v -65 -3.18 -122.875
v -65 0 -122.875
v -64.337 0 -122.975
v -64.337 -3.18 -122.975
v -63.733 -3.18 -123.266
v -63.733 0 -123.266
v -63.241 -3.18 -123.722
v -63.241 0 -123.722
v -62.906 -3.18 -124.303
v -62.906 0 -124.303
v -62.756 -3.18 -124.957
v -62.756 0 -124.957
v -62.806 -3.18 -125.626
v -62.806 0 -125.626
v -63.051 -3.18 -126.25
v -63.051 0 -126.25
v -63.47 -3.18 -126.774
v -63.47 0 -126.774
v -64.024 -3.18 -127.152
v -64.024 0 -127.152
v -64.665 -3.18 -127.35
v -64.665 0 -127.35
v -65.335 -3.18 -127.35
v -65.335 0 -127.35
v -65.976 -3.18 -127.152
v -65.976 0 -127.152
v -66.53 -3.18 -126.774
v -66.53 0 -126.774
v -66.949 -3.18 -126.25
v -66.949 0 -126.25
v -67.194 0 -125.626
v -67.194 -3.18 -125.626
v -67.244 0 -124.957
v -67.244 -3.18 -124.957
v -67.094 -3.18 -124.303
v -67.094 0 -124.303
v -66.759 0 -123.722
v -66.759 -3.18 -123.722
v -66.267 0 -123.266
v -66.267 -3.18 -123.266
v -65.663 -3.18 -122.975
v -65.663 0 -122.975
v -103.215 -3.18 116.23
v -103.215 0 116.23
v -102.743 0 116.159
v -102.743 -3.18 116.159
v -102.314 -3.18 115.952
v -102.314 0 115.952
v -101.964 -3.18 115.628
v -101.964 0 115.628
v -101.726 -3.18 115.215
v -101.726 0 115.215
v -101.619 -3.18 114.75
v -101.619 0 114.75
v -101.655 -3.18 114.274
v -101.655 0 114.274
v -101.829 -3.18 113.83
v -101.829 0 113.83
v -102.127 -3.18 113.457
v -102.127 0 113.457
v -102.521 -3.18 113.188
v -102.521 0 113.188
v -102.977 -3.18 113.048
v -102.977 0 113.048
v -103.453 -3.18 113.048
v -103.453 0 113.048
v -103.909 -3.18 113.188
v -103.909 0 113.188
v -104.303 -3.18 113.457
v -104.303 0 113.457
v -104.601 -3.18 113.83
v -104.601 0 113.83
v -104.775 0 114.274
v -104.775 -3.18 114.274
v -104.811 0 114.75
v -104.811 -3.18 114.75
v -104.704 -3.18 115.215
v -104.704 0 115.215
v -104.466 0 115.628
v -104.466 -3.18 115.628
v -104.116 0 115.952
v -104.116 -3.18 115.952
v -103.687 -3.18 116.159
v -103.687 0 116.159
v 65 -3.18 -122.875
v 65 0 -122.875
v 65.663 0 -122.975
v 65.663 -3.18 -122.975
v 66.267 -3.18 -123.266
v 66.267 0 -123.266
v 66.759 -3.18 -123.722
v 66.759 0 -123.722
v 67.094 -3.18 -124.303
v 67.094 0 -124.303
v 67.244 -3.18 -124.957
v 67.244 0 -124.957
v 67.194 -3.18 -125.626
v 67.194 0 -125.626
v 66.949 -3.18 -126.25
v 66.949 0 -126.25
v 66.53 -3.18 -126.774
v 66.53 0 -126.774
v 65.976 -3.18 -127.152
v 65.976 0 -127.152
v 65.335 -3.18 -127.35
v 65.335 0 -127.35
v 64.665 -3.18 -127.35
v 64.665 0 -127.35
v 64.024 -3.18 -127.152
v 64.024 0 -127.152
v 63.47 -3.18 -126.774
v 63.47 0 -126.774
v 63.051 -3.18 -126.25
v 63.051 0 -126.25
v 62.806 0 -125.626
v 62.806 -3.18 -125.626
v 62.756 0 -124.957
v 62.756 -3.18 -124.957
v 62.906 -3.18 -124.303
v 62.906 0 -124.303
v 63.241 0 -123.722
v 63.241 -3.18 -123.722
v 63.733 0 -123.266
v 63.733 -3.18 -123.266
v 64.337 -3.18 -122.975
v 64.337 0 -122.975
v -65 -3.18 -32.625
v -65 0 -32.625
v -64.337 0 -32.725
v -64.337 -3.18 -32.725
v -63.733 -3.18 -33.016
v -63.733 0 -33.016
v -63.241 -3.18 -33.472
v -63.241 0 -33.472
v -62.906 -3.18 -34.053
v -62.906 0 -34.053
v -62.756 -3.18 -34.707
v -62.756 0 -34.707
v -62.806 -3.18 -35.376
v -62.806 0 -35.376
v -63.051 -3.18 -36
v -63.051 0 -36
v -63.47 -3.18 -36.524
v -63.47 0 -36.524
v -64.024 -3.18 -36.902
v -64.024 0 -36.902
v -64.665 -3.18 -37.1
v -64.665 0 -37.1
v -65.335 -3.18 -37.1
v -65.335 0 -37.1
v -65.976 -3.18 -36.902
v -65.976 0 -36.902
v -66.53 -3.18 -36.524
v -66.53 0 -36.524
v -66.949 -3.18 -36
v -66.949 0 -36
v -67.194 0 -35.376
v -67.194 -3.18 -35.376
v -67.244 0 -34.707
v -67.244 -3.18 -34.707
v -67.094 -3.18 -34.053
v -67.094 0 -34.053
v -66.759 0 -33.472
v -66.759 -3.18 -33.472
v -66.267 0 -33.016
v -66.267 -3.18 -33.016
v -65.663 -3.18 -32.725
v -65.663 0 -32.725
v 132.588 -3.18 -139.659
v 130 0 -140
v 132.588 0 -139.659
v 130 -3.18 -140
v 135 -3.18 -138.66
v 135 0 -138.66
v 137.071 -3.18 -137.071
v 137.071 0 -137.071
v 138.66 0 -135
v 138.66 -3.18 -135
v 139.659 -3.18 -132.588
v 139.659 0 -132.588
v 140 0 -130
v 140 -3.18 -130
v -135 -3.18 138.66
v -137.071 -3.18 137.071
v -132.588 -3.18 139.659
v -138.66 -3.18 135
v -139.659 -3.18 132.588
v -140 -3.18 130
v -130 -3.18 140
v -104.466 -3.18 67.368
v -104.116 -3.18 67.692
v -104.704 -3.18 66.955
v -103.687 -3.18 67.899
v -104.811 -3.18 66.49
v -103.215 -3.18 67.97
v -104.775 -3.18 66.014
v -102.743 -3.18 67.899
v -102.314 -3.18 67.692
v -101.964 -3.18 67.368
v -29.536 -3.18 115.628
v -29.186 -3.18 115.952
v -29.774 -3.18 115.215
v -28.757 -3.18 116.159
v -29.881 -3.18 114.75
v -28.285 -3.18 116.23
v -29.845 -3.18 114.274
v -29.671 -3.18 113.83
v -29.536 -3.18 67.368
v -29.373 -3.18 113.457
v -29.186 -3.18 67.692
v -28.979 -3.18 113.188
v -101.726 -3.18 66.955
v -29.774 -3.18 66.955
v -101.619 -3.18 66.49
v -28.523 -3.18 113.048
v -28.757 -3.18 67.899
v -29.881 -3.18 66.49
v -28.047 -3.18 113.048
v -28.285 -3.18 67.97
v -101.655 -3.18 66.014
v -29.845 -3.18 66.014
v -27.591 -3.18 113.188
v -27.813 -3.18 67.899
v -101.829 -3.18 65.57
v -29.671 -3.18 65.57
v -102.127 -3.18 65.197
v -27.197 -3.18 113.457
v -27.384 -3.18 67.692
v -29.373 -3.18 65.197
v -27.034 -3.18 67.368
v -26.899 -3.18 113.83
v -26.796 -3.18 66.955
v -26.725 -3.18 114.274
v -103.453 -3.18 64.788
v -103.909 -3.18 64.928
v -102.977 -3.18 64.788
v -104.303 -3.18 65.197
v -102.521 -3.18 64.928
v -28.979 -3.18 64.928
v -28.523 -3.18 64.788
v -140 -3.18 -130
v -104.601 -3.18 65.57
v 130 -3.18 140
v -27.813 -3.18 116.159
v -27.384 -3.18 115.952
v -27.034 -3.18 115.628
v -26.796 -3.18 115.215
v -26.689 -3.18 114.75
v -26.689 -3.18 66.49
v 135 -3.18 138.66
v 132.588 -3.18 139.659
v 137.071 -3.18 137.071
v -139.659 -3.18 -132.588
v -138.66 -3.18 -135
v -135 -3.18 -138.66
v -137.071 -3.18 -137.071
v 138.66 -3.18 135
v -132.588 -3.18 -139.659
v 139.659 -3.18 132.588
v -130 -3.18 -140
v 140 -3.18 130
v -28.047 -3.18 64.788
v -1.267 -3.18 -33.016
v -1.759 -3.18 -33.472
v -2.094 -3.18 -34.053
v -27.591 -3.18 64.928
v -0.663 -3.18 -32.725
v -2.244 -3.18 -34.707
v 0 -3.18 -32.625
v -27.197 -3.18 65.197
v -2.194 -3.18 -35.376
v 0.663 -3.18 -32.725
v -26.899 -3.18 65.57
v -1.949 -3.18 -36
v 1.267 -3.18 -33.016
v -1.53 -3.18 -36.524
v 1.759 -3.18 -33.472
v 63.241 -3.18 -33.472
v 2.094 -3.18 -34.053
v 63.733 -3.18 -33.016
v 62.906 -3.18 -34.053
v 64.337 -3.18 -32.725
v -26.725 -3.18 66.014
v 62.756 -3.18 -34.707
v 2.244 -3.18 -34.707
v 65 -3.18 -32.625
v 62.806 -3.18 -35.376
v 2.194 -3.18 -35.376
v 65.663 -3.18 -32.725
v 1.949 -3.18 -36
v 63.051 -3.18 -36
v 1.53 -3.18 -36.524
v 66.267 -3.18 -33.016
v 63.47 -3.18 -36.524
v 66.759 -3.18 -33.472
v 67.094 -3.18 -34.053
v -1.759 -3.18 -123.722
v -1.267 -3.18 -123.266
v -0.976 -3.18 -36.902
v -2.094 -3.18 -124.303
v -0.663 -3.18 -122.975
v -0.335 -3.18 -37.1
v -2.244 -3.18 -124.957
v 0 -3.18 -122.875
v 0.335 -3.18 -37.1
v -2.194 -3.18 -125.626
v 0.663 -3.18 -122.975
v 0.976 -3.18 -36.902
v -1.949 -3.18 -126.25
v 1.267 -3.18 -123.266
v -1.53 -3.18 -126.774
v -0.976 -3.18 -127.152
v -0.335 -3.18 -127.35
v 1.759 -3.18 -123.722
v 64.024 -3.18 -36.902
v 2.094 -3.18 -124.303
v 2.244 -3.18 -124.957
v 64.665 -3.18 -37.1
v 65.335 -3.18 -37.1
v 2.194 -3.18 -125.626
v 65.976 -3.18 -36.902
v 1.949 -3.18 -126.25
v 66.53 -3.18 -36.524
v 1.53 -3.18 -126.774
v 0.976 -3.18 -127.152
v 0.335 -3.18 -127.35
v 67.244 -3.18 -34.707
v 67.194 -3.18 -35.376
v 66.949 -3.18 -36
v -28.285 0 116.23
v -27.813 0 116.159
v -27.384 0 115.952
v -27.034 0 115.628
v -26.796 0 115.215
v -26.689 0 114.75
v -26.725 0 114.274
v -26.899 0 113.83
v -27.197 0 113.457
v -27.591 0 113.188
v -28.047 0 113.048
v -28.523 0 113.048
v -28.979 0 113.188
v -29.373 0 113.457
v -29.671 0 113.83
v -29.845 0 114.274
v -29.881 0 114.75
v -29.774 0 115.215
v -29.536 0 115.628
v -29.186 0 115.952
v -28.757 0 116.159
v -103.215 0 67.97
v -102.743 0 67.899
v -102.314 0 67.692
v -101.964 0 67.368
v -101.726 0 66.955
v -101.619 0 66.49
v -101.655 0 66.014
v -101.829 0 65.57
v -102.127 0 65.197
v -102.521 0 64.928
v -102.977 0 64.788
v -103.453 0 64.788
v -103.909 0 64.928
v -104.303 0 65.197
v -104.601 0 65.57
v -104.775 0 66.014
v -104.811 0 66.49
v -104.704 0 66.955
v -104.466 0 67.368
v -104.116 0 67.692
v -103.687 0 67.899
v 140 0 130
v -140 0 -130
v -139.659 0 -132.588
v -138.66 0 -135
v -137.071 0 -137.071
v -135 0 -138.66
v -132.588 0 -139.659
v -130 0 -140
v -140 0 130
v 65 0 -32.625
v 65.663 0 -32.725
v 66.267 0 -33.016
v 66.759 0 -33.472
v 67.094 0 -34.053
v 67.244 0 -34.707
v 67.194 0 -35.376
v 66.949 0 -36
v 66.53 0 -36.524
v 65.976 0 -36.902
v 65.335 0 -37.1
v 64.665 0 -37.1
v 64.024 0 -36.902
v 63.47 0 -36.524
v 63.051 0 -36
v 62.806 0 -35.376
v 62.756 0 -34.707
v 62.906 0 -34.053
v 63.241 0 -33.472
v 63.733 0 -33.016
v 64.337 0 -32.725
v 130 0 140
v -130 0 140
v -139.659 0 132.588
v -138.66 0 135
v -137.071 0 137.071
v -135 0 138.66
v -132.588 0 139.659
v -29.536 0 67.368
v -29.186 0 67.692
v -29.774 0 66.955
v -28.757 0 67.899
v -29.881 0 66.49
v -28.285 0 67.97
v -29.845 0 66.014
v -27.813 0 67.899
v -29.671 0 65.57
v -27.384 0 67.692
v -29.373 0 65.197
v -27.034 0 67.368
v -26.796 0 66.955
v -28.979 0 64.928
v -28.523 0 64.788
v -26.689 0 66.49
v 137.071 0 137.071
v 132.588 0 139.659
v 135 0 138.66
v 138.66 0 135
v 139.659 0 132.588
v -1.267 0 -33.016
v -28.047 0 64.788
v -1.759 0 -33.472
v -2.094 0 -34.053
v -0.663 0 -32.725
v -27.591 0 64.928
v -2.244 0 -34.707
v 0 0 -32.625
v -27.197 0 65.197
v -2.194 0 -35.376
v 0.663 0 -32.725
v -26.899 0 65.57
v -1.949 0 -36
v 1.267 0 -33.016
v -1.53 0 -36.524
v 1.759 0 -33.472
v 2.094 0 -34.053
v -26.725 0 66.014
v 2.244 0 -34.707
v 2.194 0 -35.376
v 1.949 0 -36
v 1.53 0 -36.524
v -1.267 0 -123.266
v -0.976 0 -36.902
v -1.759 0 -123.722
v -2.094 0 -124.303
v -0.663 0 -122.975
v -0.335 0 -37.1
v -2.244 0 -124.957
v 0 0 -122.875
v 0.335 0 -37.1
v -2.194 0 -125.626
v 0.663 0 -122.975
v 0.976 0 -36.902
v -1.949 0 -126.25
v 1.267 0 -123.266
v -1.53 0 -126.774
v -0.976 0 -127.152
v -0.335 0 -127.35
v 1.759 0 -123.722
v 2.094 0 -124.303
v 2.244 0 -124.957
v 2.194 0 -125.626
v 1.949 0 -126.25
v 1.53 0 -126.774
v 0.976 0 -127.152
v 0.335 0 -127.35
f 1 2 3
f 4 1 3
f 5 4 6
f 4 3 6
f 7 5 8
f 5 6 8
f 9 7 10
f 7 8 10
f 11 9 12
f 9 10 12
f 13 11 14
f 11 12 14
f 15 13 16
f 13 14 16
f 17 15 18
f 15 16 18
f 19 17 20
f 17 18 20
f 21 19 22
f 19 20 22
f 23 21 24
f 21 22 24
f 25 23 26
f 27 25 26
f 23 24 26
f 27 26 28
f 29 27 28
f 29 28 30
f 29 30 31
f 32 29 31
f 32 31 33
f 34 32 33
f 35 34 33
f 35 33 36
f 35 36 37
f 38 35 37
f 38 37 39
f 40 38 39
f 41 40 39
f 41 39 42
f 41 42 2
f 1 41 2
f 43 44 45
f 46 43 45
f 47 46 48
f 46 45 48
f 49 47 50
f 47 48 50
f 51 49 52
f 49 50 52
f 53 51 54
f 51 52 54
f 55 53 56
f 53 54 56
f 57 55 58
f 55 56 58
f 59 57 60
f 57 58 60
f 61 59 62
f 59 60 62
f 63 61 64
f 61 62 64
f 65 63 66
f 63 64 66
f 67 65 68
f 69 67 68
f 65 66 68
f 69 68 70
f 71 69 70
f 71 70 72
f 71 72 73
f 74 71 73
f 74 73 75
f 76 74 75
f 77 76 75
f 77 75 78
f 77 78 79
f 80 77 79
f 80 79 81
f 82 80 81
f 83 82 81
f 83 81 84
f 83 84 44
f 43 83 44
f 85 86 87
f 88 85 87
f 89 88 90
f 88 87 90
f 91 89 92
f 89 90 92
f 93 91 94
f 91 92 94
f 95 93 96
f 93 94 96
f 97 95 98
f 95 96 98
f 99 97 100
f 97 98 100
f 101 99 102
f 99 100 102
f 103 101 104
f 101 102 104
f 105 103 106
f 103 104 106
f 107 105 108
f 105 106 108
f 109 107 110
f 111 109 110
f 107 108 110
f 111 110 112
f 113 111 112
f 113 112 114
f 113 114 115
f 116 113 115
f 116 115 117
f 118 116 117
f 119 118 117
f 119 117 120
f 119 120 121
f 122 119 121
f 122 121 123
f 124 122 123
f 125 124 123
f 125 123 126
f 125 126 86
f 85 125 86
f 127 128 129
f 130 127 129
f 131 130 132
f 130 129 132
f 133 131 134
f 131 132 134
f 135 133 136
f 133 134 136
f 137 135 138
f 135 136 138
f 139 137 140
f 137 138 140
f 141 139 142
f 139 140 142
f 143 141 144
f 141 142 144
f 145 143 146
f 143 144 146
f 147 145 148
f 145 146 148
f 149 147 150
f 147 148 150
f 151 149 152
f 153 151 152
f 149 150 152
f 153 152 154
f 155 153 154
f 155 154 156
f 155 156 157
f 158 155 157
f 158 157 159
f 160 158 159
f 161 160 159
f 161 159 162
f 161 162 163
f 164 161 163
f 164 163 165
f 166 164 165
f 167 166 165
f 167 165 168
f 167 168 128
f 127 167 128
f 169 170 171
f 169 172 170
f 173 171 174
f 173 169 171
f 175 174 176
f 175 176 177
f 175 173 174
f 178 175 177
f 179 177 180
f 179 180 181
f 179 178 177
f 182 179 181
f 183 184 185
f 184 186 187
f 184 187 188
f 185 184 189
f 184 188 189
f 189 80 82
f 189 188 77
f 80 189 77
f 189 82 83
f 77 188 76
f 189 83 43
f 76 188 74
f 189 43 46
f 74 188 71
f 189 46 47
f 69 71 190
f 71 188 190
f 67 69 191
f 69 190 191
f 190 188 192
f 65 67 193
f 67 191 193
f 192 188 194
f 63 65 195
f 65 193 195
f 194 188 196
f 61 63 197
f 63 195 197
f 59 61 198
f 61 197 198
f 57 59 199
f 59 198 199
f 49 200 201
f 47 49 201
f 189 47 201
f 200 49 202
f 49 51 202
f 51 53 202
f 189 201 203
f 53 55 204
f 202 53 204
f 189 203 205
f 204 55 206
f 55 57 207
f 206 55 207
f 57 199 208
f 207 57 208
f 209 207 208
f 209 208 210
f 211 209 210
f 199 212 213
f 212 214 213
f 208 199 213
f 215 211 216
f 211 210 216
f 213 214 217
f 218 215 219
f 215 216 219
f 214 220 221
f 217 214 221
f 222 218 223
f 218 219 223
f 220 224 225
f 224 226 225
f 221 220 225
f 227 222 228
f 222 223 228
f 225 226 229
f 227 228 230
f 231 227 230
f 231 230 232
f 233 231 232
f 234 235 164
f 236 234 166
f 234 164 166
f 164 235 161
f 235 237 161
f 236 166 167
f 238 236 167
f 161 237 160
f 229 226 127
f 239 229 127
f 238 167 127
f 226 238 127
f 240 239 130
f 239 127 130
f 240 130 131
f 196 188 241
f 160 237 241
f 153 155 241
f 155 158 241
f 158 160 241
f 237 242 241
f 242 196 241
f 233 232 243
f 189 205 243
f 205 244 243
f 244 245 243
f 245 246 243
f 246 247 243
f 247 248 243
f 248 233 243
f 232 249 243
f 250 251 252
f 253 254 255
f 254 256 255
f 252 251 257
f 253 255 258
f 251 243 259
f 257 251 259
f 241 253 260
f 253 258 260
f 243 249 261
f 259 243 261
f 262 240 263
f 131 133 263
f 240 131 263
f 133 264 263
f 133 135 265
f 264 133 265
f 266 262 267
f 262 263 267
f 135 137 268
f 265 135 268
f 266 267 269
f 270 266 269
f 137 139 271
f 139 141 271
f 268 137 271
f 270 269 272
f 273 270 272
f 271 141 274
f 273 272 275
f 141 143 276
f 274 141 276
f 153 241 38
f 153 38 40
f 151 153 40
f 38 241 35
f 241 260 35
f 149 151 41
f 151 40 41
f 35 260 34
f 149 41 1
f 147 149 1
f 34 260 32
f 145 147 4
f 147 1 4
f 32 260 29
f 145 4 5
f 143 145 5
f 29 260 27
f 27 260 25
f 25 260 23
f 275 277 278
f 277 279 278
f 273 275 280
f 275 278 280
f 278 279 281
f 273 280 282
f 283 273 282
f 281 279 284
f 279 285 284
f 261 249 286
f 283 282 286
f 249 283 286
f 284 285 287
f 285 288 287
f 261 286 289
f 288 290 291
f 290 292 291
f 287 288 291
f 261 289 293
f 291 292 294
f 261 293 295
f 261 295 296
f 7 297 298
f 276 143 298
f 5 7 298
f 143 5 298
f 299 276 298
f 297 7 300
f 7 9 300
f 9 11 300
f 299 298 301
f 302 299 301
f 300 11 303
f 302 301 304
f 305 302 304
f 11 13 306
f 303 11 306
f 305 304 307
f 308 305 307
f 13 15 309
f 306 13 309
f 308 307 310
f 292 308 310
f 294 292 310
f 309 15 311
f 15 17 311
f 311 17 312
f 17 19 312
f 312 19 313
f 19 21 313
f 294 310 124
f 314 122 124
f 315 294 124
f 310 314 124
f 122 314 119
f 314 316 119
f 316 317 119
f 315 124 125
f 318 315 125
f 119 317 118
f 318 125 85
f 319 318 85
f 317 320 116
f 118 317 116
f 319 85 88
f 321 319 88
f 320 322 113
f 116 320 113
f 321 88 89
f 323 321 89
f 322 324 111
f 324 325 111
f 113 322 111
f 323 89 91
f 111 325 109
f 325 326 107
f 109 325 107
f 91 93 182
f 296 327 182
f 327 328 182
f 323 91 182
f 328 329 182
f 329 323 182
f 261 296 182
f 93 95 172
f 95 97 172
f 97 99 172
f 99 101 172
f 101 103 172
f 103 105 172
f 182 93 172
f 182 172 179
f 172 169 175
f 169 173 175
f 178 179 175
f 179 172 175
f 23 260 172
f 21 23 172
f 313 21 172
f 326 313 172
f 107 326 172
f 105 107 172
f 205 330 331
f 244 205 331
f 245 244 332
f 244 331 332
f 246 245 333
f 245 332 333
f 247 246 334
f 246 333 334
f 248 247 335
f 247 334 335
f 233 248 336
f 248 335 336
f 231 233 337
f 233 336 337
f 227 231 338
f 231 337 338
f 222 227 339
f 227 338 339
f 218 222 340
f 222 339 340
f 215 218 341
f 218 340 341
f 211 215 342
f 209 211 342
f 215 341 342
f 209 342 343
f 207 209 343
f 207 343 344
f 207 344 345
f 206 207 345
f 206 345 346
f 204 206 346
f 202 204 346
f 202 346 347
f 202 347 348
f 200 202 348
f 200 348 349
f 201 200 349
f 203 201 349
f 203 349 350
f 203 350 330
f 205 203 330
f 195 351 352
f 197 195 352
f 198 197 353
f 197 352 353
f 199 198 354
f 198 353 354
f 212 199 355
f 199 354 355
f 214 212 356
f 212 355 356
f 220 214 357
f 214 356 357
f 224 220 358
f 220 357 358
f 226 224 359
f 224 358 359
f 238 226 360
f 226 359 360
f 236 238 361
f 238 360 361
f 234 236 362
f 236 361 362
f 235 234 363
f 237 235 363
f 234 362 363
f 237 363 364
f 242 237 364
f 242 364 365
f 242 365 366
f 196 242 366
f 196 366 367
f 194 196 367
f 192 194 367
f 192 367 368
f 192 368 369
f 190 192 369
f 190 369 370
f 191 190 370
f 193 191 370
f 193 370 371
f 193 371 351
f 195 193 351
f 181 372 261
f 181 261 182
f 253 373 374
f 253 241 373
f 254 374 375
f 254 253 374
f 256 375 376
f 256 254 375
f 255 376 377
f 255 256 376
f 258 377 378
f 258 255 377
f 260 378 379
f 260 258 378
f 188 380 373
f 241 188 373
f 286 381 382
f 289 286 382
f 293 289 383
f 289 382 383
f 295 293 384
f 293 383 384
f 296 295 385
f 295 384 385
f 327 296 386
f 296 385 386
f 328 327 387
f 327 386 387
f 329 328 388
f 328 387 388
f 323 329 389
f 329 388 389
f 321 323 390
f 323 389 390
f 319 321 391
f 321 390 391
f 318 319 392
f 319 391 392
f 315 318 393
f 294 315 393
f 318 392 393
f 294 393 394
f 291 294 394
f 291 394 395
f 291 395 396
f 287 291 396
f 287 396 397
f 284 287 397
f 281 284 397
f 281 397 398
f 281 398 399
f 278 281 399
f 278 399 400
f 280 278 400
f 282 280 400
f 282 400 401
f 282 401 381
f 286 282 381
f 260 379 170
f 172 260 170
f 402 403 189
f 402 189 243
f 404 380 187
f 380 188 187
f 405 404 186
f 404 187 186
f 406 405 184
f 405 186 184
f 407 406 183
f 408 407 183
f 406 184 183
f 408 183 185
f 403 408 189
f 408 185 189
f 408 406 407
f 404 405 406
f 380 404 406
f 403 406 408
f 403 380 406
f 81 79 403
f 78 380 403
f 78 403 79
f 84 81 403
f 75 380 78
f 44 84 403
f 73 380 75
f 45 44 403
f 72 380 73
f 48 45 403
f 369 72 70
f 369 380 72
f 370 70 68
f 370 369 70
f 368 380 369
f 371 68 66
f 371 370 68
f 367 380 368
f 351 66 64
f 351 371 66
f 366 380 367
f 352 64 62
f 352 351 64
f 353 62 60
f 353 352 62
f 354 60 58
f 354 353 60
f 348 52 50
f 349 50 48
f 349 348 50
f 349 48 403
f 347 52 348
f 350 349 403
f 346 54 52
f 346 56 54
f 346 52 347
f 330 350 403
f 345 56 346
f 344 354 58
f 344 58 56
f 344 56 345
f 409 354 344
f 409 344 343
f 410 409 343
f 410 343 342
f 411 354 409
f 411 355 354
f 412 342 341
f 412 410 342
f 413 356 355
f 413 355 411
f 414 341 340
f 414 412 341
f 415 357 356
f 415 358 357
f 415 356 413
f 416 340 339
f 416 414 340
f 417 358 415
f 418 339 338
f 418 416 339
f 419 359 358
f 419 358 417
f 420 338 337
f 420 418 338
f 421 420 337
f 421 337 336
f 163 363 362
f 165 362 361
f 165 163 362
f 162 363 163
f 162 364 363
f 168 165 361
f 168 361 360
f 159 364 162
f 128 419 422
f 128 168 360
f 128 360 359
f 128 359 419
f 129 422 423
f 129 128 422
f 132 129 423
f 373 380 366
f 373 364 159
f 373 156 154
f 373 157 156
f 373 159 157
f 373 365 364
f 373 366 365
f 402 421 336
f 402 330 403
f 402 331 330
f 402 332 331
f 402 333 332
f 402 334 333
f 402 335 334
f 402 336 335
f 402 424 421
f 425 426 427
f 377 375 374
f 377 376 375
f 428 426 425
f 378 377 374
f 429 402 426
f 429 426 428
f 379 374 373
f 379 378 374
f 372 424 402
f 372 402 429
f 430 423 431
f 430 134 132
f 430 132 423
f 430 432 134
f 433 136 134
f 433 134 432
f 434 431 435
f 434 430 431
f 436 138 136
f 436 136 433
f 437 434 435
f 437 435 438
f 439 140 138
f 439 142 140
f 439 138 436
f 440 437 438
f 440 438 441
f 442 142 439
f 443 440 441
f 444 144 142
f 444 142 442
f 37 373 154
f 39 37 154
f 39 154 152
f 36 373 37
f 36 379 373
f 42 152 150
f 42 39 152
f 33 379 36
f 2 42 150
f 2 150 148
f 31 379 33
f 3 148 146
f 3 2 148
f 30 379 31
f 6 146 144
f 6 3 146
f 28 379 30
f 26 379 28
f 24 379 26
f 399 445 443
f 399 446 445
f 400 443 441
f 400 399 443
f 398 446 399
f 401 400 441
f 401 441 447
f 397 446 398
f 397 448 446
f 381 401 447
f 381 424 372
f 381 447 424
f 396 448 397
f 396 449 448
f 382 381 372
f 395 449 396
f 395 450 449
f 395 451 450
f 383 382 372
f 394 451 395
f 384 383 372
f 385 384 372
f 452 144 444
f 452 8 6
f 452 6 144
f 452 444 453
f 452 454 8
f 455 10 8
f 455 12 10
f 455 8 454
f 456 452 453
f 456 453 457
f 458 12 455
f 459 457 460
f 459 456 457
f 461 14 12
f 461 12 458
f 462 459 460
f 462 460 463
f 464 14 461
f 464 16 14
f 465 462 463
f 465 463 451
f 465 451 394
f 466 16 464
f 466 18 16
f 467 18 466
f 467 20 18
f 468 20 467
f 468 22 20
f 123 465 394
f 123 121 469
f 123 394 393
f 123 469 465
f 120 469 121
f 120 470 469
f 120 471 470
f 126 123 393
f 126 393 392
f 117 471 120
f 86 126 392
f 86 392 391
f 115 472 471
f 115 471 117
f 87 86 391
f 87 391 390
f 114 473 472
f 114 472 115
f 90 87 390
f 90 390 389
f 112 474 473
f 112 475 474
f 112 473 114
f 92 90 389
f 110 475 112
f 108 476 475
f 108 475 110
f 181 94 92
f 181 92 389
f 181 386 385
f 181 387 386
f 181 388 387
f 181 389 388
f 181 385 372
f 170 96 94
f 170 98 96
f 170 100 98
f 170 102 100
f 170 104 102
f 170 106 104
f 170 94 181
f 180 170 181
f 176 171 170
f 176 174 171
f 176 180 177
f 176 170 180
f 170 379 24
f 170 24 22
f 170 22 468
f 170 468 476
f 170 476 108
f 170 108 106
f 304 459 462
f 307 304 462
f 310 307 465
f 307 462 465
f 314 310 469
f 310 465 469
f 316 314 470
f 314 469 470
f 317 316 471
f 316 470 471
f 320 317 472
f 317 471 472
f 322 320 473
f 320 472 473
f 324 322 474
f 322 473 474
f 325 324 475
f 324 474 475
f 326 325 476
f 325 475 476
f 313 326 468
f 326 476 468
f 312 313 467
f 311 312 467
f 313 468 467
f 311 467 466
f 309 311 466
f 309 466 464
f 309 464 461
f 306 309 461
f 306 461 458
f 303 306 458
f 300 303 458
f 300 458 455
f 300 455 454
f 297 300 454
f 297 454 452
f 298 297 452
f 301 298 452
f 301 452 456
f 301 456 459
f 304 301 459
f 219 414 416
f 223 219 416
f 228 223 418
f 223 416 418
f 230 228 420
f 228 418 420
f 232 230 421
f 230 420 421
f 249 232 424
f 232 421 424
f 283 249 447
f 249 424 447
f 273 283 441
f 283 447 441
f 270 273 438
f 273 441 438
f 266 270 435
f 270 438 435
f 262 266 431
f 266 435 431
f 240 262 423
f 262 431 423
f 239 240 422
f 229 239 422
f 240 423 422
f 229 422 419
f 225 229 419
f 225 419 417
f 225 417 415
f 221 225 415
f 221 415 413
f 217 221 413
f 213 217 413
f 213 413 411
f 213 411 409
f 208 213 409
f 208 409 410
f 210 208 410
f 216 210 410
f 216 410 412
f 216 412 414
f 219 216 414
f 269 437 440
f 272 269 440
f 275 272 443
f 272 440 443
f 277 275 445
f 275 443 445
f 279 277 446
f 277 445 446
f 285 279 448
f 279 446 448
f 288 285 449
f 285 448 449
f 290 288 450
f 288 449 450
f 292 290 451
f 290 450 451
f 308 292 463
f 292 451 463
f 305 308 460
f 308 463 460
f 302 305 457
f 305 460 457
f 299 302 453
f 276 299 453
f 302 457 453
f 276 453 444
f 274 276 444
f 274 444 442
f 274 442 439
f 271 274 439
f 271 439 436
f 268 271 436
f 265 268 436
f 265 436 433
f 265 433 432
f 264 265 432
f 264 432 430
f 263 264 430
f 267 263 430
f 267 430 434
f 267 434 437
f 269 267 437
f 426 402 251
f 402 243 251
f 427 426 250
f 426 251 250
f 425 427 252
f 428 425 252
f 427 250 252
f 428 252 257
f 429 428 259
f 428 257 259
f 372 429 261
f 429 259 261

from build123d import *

# Parameters (mm, degrees)
SKETCH1_W          = 280
SKETCH1_H          = 280
BASE_FLANGE1_DEPTH = 3.18
SKETCH6_R          = 2.25
SKETCH6_R_2        = 1.6
CUT_EXTRUDE1_DEPTH = 10
FILLET1_R          = 10


# Sheet-metal steps are written as plain solids
with BuildPart() as part:
    # Sketch1 → Base-Flange1 (new body)
    with BuildSketch(Plane(origin=(0, 0, 0), x_dir=(1, 0, 0), z_dir=(0, 1, 0))):
        Rectangle(SKETCH1_W, SKETCH1_H)
    extrude(amount=-BASE_FLANGE1_DEPTH)

    # Sketch6 → Cut-Extrude1 (cut)
    with BuildSketch(Plane(origin=(0, 0, 0), x_dir=(1, 0, 0), z_dir=(0, 1, 0))):
        with Locations(Location((0, 125.125, 0), (0, 0, 270))):
            Circle(SKETCH6_R)
        with Locations(Location((0, 34.875, 0), (0, 0, 270))):
            Circle(SKETCH6_R)
        with Locations(Location((65, 34.875, 0), (0, 0, 270))):
            Circle(SKETCH6_R)
        with Locations(Location((65, 125.125, 0), (0, 0, 270))):
            Circle(SKETCH6_R)
        with Locations(Location((-103.215, -114.63, 0), (0, 0, 270))):
            Circle(SKETCH6_R_2)
        with Locations(Location((-28.285, -114.63, 0), (0, 0, 270))):
            Circle(SKETCH6_R_2)
        with Locations(Location((-28.285, -66.37, 0), (0, 0, 270))):
            Circle(SKETCH6_R_2)
        with Locations(Location((-103.215, -66.37, 0), (0, 0, 270))):
            Circle(SKETCH6_R_2)
        with Locations(Location((-65, 34.875, 0), (0, 0, 270))):
            Circle(SKETCH6_R)
        with Locations(Location((-65, 125.125, 0), (0, 0, 270))):
            Circle(SKETCH6_R)
    extrude(amount=-CUT_EXTRUDE1_DEPTH, mode=Mode.SUBTRACT)

    # Fillet1
    fillet1_edges = [part.edges().sort_by_distance(p)[0] for p in [
        (140, -1.59, 140),
        (-140, -1.59, 140),
        (-140, -1.59, -140),
        (140, -1.59, -140),
    ]]
    fillet(fillet1_edges, radius=FILLET1_R)


solid = part.part
